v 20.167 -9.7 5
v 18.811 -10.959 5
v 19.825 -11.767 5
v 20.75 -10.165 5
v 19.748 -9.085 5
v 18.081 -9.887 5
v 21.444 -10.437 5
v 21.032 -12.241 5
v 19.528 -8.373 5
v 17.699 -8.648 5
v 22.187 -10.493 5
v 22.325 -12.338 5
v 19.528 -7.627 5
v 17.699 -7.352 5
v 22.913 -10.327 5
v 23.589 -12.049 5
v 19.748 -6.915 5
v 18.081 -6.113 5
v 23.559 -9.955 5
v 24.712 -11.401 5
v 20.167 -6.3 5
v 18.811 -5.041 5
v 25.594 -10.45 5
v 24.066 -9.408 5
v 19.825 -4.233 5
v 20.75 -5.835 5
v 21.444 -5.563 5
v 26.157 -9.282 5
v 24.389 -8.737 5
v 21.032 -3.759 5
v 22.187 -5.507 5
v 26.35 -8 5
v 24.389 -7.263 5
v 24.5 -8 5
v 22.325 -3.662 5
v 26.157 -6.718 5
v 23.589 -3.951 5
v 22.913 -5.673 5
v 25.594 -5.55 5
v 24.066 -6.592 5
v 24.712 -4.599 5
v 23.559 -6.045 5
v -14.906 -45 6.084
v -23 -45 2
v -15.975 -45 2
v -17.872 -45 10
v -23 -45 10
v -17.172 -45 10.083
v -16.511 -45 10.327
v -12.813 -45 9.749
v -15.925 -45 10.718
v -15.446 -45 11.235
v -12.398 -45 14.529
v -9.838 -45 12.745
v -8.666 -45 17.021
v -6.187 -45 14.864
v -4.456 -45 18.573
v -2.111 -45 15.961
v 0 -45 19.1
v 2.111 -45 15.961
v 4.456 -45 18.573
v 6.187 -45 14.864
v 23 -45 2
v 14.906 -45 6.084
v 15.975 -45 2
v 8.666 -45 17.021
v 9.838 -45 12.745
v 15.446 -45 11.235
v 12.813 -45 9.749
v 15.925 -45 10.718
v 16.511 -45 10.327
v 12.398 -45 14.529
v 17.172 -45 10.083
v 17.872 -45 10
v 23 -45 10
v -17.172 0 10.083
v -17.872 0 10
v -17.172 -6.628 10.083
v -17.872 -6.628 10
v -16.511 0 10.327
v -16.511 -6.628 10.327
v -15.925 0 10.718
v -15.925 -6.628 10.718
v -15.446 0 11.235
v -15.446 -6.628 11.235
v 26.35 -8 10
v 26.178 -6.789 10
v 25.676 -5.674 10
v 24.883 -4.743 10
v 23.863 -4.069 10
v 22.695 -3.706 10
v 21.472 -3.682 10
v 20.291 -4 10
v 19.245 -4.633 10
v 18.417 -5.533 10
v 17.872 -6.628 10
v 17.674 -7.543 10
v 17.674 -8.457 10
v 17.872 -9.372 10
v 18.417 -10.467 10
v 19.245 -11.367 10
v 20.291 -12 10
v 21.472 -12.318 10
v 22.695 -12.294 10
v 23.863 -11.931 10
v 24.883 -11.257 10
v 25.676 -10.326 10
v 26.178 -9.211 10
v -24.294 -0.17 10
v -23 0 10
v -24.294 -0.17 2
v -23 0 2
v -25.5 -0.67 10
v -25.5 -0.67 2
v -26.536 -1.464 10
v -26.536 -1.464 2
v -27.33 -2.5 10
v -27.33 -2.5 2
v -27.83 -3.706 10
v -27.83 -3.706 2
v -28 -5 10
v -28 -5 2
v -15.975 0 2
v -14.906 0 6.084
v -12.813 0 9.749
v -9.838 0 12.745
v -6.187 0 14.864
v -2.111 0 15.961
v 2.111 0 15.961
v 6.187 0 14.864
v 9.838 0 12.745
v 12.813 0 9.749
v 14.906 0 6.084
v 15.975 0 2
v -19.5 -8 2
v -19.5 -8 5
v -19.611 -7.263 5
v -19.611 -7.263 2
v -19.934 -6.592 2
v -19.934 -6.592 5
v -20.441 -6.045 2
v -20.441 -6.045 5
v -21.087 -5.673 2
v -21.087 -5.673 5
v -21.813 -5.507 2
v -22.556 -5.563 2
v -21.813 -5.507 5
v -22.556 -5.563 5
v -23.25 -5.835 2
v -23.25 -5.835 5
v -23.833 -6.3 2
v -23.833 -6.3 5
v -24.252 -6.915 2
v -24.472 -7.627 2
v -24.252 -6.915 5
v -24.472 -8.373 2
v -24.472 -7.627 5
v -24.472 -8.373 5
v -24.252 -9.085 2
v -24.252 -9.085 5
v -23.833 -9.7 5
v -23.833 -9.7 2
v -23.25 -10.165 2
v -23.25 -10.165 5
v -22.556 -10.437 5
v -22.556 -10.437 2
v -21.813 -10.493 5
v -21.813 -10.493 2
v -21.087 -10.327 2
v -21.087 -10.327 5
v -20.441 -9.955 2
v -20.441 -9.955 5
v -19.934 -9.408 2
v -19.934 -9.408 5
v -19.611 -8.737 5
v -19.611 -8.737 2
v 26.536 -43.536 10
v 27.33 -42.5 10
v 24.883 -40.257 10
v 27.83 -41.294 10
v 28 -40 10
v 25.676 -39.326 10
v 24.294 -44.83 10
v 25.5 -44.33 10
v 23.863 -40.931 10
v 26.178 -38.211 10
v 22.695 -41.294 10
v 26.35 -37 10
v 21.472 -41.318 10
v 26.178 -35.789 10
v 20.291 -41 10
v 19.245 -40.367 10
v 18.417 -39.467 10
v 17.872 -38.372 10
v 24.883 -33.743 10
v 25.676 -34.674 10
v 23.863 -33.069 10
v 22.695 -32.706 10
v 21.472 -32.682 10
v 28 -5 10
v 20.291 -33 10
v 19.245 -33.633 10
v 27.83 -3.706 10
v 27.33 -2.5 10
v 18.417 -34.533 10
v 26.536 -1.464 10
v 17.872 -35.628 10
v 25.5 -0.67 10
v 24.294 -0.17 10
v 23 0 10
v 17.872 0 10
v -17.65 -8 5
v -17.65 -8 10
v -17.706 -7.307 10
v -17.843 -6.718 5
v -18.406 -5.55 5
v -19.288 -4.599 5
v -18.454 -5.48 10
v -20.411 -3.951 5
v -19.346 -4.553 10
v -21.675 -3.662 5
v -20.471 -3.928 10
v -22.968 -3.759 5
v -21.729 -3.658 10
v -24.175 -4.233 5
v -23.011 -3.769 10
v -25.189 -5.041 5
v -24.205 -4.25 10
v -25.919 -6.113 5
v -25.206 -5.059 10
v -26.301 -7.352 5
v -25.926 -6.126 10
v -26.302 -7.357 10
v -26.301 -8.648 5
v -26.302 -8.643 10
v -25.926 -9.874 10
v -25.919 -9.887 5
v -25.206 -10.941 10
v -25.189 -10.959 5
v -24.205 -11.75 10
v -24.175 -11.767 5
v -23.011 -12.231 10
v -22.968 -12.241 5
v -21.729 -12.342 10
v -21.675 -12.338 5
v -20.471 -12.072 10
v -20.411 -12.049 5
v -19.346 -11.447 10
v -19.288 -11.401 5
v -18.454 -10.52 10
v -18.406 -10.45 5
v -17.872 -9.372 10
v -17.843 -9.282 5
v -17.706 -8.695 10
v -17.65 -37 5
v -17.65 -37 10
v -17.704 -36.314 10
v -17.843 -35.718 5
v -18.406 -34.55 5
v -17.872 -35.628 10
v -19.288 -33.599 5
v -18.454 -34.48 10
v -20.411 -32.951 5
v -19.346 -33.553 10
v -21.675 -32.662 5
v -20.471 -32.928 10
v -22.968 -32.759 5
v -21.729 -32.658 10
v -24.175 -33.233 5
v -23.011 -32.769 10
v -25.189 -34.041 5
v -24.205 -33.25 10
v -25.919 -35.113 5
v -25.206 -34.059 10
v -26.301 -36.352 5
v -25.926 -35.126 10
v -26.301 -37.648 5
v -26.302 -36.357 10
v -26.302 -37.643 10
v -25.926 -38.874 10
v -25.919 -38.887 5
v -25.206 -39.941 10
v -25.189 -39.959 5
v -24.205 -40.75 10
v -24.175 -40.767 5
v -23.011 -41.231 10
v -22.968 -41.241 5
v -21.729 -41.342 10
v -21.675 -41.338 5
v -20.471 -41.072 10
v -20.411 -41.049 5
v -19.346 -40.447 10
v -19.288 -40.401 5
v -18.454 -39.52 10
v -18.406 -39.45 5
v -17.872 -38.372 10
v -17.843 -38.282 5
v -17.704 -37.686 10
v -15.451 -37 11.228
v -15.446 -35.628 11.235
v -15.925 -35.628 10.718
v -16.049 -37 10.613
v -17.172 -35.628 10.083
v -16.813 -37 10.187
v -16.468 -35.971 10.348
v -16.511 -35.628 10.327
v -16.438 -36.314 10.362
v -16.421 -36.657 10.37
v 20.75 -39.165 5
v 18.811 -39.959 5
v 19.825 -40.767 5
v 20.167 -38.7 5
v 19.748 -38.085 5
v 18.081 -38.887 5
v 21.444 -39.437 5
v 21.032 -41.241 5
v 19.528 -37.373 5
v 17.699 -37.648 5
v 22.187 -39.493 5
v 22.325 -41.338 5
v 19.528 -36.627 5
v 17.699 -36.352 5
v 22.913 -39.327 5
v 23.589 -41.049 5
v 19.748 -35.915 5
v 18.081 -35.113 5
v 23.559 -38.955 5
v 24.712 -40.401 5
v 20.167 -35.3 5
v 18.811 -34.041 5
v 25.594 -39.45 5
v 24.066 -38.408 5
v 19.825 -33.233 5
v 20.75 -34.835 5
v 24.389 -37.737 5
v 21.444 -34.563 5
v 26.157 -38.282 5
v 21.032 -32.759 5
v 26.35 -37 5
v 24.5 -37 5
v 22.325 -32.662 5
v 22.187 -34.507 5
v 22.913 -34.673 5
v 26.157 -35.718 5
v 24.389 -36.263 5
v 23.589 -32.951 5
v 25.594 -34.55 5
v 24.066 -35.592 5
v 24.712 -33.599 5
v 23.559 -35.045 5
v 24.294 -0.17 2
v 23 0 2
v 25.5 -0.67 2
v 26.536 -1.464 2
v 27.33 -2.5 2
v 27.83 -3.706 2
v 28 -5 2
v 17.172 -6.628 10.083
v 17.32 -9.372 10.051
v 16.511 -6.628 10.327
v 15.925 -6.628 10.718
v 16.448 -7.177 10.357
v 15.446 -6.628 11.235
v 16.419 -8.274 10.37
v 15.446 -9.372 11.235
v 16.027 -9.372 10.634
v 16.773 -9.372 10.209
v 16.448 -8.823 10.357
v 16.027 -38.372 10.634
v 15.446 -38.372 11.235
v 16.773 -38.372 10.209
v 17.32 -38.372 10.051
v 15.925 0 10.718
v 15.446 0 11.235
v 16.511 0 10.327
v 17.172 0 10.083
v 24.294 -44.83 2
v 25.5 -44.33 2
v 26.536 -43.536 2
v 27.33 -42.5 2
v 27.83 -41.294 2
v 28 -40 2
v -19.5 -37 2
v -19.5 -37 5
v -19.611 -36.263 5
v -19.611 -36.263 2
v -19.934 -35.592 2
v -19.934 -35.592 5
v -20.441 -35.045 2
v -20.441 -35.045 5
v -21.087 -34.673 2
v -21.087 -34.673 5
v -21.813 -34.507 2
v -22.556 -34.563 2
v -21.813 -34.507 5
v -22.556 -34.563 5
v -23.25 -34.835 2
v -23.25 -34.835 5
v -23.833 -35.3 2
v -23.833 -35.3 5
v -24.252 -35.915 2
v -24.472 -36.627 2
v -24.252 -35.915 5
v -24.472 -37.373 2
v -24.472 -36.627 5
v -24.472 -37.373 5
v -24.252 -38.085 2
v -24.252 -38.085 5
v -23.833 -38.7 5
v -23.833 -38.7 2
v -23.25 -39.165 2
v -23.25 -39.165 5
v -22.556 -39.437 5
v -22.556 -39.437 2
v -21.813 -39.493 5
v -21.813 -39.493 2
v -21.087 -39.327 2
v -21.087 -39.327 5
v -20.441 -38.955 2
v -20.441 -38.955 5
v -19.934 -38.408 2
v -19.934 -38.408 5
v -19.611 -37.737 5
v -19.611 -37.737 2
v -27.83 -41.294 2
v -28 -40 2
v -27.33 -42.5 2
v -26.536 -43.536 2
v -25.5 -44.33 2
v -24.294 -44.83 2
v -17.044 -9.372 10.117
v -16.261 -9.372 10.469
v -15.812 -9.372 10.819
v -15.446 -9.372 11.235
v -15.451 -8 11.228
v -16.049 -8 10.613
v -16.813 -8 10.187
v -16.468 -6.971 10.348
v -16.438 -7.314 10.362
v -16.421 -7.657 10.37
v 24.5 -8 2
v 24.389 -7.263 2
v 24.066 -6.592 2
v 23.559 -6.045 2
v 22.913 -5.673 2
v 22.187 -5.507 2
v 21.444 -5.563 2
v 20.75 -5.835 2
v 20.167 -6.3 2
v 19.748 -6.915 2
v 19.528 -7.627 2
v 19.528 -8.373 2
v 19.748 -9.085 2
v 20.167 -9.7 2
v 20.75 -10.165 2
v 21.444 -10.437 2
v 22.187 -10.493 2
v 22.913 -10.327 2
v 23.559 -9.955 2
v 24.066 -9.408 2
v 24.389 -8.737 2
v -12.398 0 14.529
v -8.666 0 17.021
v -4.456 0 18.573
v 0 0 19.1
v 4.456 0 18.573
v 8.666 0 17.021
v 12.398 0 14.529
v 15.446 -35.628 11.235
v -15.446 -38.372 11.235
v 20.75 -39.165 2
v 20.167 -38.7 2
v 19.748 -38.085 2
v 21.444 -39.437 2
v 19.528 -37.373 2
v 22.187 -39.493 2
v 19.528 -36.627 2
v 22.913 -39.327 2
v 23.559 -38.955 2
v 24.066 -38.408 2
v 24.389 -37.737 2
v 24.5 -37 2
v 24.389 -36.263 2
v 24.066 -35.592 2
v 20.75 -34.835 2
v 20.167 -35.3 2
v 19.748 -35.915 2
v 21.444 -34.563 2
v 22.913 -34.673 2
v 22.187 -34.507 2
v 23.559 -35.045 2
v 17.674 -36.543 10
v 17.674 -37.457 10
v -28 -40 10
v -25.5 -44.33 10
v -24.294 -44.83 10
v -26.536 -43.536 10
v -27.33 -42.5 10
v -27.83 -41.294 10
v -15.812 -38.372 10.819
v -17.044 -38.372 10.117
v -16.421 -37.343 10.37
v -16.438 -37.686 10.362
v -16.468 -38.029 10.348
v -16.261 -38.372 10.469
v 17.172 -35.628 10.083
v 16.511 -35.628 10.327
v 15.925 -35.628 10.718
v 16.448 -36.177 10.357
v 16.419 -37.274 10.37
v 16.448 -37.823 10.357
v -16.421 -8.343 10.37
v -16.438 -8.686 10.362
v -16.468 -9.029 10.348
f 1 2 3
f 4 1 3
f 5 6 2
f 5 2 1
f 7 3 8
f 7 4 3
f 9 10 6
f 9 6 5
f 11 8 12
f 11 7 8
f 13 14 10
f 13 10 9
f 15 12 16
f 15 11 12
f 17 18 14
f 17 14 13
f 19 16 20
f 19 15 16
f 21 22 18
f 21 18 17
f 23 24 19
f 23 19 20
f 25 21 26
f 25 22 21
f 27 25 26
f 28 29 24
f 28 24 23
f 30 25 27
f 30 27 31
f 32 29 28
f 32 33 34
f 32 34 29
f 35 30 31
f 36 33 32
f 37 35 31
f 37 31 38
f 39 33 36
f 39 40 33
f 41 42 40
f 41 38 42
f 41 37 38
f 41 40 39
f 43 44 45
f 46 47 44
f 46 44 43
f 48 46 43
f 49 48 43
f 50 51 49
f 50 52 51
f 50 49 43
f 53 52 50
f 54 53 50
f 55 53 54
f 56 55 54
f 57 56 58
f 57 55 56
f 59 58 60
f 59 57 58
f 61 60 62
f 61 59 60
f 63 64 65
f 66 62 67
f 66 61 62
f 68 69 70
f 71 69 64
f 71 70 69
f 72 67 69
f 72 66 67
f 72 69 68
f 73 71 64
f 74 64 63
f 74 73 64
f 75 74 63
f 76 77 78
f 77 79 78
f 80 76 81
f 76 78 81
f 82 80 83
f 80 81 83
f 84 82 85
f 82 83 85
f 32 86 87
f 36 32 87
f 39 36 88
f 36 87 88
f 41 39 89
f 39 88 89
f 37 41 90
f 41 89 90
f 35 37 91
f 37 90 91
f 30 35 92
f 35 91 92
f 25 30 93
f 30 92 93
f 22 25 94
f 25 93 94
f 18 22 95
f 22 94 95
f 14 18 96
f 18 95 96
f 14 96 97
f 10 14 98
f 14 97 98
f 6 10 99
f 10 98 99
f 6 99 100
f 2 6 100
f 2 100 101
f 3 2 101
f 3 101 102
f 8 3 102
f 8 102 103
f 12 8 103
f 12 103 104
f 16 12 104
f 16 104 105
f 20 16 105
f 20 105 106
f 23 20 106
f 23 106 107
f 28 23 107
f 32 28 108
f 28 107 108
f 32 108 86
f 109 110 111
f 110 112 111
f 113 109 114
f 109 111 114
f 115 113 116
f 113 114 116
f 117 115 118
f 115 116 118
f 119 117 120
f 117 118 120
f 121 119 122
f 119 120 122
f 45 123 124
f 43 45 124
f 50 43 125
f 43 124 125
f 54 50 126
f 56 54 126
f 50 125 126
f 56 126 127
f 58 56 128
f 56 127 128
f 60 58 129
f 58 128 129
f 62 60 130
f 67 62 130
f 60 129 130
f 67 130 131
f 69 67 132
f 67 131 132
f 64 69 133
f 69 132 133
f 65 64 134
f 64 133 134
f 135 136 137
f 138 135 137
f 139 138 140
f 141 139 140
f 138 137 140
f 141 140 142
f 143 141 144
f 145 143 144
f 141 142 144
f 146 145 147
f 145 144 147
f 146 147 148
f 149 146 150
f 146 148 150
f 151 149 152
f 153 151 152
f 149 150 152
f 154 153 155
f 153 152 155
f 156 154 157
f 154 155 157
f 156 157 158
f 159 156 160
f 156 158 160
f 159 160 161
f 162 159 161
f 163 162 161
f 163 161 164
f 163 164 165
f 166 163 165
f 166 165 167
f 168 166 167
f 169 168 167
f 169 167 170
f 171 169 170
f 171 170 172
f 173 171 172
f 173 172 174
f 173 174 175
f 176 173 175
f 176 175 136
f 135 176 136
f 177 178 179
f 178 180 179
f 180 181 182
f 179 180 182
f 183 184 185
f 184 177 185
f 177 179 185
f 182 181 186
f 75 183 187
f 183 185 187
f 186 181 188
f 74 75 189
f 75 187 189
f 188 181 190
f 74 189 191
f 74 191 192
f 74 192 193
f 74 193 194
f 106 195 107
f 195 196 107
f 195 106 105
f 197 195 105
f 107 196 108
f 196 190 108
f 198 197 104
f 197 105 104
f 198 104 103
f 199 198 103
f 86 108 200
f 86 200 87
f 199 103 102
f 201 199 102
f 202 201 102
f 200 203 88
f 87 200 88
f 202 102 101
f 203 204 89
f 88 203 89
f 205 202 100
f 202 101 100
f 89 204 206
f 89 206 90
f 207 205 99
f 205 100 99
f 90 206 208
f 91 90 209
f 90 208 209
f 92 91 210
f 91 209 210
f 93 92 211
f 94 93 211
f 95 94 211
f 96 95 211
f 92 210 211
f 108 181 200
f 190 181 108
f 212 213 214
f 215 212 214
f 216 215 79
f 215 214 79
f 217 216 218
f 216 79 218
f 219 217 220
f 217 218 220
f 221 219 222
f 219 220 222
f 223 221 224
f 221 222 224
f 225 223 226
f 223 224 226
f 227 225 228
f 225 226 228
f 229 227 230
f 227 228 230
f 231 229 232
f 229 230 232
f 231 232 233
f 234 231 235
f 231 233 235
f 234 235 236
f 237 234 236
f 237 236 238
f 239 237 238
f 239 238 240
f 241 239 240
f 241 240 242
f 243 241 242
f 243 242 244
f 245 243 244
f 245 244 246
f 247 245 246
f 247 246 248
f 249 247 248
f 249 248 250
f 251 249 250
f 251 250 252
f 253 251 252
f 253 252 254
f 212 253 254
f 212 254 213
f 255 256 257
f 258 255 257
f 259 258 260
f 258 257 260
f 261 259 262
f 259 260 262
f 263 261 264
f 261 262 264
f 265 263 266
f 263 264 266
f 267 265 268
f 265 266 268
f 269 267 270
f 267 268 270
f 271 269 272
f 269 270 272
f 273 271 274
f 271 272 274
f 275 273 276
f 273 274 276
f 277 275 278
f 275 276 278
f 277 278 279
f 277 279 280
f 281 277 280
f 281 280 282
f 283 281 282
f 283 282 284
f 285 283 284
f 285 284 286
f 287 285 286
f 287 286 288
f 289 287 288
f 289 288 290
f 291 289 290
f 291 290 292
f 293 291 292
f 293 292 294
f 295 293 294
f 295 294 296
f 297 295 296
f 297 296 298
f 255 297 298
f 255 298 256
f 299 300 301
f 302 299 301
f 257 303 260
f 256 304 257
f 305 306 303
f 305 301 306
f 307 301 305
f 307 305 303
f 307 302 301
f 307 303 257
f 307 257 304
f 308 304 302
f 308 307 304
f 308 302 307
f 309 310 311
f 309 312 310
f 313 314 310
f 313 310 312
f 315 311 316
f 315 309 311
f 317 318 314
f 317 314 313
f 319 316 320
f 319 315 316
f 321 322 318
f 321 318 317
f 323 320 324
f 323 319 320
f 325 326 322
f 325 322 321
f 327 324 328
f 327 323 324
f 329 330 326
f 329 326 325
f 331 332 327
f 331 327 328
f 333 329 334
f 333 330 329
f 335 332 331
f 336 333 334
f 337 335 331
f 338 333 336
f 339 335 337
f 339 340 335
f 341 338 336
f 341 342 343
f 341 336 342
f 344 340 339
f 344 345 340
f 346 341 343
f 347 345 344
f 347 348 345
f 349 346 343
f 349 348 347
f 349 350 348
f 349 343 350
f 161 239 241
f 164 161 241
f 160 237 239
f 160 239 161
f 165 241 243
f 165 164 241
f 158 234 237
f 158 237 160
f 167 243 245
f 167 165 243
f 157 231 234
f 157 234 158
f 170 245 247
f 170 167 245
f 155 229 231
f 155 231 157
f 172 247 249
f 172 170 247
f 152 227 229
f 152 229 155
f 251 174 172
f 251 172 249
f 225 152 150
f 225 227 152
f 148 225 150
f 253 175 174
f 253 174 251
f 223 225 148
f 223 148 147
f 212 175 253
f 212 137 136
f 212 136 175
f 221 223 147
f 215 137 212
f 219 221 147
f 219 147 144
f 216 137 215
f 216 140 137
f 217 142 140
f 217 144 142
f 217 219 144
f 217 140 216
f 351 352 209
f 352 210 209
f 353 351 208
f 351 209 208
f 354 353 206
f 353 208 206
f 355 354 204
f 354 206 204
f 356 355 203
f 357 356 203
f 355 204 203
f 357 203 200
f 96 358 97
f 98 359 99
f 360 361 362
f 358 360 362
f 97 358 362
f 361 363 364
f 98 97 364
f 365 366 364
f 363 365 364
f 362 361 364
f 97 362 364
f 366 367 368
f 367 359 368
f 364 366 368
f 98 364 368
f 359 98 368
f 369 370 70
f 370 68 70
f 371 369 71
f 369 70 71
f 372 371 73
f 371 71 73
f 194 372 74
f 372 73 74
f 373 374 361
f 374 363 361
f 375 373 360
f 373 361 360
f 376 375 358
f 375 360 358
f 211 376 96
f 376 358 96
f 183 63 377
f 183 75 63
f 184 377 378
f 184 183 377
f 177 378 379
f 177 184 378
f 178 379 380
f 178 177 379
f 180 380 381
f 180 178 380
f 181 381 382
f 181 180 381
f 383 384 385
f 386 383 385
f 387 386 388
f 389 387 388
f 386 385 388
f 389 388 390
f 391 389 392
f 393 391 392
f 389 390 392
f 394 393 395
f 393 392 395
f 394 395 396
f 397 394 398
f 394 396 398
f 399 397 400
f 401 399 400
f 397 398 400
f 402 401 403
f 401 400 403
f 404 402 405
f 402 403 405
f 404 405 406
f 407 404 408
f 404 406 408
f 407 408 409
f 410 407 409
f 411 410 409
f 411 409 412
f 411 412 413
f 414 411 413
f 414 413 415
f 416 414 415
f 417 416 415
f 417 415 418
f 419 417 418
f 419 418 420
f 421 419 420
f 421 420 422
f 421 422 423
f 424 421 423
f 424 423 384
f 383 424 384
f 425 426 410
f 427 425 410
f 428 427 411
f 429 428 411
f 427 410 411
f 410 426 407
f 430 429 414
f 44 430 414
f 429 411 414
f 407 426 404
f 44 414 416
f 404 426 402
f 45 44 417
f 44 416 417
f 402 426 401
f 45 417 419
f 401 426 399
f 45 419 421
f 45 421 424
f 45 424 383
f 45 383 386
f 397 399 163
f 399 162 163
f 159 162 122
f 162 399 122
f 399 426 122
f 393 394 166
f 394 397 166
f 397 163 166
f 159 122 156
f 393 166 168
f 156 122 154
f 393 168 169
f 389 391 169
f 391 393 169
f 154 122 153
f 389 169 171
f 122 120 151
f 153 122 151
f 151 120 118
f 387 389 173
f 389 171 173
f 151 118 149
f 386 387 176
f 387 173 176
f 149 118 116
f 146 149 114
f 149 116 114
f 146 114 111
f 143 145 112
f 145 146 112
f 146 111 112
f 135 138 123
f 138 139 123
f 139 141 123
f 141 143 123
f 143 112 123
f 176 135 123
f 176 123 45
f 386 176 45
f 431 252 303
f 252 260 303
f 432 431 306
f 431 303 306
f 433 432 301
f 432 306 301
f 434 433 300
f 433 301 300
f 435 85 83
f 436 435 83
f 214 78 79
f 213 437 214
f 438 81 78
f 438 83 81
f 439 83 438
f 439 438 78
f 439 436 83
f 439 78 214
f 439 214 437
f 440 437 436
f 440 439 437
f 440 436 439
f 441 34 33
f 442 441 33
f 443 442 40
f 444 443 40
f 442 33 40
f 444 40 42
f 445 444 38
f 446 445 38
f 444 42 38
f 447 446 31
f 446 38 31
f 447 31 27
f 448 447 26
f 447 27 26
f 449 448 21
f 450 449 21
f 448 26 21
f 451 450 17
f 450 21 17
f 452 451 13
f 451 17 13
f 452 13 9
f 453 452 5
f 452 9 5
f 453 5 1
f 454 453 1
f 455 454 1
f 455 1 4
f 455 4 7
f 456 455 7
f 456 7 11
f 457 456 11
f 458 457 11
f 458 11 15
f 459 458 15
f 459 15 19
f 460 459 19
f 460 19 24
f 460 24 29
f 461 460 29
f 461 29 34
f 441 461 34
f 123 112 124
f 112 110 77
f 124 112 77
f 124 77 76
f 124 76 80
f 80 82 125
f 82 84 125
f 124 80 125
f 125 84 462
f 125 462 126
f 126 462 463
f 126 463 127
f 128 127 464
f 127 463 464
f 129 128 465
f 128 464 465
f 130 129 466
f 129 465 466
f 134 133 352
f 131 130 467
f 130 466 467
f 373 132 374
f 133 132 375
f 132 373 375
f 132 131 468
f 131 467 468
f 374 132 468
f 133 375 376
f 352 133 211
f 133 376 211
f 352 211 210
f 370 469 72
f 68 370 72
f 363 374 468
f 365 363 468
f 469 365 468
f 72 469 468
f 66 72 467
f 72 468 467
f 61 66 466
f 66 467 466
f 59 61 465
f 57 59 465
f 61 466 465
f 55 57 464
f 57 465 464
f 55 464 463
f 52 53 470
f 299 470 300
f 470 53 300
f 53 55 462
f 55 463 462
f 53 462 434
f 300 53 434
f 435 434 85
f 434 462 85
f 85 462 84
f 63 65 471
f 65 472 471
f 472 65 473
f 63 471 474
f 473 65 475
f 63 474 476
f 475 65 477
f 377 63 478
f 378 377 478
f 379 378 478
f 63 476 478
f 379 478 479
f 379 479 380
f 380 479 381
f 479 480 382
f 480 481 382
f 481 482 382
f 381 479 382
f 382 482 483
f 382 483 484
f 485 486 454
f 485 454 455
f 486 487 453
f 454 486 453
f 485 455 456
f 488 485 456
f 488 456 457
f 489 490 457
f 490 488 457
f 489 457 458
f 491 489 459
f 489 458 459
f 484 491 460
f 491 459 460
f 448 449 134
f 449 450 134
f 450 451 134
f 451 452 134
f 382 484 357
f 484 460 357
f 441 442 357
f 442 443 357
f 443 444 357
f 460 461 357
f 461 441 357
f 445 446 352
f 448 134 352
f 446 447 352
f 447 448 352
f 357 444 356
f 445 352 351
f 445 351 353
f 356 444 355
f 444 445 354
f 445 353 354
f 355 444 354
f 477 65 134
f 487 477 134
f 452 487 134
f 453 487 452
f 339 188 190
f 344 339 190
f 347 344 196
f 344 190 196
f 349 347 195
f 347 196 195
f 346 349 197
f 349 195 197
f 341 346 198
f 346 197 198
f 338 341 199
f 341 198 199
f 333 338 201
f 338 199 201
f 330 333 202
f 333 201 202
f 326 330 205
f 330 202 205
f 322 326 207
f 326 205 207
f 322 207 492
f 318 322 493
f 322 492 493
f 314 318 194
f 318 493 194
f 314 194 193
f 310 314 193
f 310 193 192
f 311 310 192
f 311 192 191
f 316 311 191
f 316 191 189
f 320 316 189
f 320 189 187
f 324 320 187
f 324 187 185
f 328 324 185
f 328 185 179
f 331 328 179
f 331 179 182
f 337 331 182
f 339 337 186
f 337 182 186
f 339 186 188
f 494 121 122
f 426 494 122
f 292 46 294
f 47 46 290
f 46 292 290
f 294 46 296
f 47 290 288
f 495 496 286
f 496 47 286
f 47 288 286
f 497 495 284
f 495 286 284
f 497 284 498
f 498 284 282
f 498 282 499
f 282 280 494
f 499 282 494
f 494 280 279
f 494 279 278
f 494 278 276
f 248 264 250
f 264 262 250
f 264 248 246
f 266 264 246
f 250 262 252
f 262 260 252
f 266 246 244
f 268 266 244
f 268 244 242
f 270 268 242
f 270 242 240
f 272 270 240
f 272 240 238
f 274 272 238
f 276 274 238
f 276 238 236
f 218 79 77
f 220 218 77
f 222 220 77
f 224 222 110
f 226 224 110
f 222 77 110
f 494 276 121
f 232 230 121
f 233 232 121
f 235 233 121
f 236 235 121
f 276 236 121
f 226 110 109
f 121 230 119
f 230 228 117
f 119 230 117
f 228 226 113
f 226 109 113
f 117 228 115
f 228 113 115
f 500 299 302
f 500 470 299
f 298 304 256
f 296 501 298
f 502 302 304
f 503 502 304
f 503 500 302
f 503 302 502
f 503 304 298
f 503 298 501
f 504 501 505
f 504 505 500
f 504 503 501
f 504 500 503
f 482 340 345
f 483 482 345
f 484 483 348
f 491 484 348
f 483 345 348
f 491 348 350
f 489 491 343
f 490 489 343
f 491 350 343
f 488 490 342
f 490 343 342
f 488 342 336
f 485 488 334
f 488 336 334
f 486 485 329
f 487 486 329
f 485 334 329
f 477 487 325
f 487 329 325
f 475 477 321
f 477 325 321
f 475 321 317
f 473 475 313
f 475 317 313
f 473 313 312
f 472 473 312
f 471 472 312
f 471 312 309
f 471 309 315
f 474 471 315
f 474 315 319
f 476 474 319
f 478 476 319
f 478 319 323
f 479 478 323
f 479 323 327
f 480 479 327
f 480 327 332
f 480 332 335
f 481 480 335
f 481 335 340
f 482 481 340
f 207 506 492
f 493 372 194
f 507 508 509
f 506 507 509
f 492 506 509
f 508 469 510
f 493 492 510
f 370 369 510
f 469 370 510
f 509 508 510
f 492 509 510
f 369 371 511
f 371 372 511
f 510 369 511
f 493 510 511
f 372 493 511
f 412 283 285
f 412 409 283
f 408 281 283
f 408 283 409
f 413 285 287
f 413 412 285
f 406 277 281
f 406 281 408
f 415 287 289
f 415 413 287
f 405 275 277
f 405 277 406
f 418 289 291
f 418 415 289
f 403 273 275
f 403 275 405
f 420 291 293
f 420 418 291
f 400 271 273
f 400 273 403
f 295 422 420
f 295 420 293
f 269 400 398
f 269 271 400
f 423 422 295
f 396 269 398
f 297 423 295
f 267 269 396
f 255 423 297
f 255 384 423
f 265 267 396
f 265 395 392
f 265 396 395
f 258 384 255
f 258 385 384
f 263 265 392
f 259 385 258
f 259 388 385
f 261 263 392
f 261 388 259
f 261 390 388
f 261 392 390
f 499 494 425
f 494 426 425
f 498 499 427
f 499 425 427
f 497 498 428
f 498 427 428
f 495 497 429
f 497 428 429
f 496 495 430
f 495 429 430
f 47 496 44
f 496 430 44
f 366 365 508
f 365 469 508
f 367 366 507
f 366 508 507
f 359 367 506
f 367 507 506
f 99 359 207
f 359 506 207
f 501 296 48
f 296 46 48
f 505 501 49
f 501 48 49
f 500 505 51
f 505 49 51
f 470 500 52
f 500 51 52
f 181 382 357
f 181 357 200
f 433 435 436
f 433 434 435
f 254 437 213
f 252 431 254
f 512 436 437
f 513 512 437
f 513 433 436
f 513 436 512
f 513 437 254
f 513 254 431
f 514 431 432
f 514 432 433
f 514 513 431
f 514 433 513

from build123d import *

# Parameters (mm, degrees)
F1_DEPTH = 45
F2_R     = 2.5
F2_R_2   = 4.35
F3_DEPTH = 5
F4_DEPTH = 8.001
F5_R     = 3
F6_R     = 5


with BuildPart() as f1:
    # F0 (on Front) → F1 (new body)
    with BuildSketch(Plane.XZ):
        with BuildLine():
            Line((-28, 10), (-28, 2))
            Line((-28, 2), (-15.975293, 2))
            ThreePointArc((-15.975293, 2), (0, 16.1), (15.975293, 2))
            Line((15.975293, 2), (28, 2))
            Line((28, 2), (28, 10))
            Line((28, 10), (16.272984, 10))
            ThreePointArc((16.272984, 10), (0, 19.1), (-16.272984, 10))
            Line((-16.272984, 10), (-28, 10))
        make_face()
    extrude(amount=F1_DEPTH)

    # F2 (on face) → F3 (cut)
    with BuildSketch(Plane.XY.offset(10)):
        with Locations((-22, -8)):
            Circle(F2_R)
        with Locations((-22, -8)):
            Circle(F2_R_2)
        with Locations((-22, -8)):
            Circle(F2_R, mode=Mode.SUBTRACT)
        with Locations((22, -8)):
            Circle(F2_R)
        with Locations((22, -8)):
            Circle(F2_R_2)
        with Locations((22, -8)):
            Circle(F2_R, mode=Mode.SUBTRACT)
        with Locations((22, -37)):
            Circle(F2_R)
        with Locations((22, -37)):
            Circle(F2_R_2)
        with Locations((22, -37)):
            Circle(F2_R, mode=Mode.SUBTRACT)
        with Locations((-22, -37)):
            Circle(F2_R)
        with Locations((-22, -37)):
            Circle(F2_R_2)
        with Locations((-22, -37)):
            Circle(F2_R, mode=Mode.SUBTRACT)
    extrude(amount=-F3_DEPTH, mode=Mode.SUBTRACT)

    # F2 (on face) → F4 (cut, through all)
    with BuildSketch(Plane.XY.offset(10)):
        with Locations((-22, -8)):
            Circle(F2_R)
        with Locations((22, -8)):
            Circle(F2_R)
        with Locations((-22, -37)):
            Circle(F2_R)
        with Locations((22, -37)):
            Circle(F2_R)
    extrude(amount=-F4_DEPTH, mode=Mode.SUBTRACT)

    # F5
    f5_edges = [f1.edges().sort_by_distance(p)[0] for p in [
        (-16.272984, -22.5, 10),
        (16.272984, -22.5, 10),
    ]]
    fillet(f5_edges, radius=F5_R)

    # F6
    f6_edges = [f1.edges().sort_by_distance(p)[0] for p in [
        (28, -45, 6),
        (28, 0, 6),
        (-28, -45, 6),
        (-28, 0, 6),
    ]]
    fillet(f6_edges, radius=F6_R)


solid = f1.part
